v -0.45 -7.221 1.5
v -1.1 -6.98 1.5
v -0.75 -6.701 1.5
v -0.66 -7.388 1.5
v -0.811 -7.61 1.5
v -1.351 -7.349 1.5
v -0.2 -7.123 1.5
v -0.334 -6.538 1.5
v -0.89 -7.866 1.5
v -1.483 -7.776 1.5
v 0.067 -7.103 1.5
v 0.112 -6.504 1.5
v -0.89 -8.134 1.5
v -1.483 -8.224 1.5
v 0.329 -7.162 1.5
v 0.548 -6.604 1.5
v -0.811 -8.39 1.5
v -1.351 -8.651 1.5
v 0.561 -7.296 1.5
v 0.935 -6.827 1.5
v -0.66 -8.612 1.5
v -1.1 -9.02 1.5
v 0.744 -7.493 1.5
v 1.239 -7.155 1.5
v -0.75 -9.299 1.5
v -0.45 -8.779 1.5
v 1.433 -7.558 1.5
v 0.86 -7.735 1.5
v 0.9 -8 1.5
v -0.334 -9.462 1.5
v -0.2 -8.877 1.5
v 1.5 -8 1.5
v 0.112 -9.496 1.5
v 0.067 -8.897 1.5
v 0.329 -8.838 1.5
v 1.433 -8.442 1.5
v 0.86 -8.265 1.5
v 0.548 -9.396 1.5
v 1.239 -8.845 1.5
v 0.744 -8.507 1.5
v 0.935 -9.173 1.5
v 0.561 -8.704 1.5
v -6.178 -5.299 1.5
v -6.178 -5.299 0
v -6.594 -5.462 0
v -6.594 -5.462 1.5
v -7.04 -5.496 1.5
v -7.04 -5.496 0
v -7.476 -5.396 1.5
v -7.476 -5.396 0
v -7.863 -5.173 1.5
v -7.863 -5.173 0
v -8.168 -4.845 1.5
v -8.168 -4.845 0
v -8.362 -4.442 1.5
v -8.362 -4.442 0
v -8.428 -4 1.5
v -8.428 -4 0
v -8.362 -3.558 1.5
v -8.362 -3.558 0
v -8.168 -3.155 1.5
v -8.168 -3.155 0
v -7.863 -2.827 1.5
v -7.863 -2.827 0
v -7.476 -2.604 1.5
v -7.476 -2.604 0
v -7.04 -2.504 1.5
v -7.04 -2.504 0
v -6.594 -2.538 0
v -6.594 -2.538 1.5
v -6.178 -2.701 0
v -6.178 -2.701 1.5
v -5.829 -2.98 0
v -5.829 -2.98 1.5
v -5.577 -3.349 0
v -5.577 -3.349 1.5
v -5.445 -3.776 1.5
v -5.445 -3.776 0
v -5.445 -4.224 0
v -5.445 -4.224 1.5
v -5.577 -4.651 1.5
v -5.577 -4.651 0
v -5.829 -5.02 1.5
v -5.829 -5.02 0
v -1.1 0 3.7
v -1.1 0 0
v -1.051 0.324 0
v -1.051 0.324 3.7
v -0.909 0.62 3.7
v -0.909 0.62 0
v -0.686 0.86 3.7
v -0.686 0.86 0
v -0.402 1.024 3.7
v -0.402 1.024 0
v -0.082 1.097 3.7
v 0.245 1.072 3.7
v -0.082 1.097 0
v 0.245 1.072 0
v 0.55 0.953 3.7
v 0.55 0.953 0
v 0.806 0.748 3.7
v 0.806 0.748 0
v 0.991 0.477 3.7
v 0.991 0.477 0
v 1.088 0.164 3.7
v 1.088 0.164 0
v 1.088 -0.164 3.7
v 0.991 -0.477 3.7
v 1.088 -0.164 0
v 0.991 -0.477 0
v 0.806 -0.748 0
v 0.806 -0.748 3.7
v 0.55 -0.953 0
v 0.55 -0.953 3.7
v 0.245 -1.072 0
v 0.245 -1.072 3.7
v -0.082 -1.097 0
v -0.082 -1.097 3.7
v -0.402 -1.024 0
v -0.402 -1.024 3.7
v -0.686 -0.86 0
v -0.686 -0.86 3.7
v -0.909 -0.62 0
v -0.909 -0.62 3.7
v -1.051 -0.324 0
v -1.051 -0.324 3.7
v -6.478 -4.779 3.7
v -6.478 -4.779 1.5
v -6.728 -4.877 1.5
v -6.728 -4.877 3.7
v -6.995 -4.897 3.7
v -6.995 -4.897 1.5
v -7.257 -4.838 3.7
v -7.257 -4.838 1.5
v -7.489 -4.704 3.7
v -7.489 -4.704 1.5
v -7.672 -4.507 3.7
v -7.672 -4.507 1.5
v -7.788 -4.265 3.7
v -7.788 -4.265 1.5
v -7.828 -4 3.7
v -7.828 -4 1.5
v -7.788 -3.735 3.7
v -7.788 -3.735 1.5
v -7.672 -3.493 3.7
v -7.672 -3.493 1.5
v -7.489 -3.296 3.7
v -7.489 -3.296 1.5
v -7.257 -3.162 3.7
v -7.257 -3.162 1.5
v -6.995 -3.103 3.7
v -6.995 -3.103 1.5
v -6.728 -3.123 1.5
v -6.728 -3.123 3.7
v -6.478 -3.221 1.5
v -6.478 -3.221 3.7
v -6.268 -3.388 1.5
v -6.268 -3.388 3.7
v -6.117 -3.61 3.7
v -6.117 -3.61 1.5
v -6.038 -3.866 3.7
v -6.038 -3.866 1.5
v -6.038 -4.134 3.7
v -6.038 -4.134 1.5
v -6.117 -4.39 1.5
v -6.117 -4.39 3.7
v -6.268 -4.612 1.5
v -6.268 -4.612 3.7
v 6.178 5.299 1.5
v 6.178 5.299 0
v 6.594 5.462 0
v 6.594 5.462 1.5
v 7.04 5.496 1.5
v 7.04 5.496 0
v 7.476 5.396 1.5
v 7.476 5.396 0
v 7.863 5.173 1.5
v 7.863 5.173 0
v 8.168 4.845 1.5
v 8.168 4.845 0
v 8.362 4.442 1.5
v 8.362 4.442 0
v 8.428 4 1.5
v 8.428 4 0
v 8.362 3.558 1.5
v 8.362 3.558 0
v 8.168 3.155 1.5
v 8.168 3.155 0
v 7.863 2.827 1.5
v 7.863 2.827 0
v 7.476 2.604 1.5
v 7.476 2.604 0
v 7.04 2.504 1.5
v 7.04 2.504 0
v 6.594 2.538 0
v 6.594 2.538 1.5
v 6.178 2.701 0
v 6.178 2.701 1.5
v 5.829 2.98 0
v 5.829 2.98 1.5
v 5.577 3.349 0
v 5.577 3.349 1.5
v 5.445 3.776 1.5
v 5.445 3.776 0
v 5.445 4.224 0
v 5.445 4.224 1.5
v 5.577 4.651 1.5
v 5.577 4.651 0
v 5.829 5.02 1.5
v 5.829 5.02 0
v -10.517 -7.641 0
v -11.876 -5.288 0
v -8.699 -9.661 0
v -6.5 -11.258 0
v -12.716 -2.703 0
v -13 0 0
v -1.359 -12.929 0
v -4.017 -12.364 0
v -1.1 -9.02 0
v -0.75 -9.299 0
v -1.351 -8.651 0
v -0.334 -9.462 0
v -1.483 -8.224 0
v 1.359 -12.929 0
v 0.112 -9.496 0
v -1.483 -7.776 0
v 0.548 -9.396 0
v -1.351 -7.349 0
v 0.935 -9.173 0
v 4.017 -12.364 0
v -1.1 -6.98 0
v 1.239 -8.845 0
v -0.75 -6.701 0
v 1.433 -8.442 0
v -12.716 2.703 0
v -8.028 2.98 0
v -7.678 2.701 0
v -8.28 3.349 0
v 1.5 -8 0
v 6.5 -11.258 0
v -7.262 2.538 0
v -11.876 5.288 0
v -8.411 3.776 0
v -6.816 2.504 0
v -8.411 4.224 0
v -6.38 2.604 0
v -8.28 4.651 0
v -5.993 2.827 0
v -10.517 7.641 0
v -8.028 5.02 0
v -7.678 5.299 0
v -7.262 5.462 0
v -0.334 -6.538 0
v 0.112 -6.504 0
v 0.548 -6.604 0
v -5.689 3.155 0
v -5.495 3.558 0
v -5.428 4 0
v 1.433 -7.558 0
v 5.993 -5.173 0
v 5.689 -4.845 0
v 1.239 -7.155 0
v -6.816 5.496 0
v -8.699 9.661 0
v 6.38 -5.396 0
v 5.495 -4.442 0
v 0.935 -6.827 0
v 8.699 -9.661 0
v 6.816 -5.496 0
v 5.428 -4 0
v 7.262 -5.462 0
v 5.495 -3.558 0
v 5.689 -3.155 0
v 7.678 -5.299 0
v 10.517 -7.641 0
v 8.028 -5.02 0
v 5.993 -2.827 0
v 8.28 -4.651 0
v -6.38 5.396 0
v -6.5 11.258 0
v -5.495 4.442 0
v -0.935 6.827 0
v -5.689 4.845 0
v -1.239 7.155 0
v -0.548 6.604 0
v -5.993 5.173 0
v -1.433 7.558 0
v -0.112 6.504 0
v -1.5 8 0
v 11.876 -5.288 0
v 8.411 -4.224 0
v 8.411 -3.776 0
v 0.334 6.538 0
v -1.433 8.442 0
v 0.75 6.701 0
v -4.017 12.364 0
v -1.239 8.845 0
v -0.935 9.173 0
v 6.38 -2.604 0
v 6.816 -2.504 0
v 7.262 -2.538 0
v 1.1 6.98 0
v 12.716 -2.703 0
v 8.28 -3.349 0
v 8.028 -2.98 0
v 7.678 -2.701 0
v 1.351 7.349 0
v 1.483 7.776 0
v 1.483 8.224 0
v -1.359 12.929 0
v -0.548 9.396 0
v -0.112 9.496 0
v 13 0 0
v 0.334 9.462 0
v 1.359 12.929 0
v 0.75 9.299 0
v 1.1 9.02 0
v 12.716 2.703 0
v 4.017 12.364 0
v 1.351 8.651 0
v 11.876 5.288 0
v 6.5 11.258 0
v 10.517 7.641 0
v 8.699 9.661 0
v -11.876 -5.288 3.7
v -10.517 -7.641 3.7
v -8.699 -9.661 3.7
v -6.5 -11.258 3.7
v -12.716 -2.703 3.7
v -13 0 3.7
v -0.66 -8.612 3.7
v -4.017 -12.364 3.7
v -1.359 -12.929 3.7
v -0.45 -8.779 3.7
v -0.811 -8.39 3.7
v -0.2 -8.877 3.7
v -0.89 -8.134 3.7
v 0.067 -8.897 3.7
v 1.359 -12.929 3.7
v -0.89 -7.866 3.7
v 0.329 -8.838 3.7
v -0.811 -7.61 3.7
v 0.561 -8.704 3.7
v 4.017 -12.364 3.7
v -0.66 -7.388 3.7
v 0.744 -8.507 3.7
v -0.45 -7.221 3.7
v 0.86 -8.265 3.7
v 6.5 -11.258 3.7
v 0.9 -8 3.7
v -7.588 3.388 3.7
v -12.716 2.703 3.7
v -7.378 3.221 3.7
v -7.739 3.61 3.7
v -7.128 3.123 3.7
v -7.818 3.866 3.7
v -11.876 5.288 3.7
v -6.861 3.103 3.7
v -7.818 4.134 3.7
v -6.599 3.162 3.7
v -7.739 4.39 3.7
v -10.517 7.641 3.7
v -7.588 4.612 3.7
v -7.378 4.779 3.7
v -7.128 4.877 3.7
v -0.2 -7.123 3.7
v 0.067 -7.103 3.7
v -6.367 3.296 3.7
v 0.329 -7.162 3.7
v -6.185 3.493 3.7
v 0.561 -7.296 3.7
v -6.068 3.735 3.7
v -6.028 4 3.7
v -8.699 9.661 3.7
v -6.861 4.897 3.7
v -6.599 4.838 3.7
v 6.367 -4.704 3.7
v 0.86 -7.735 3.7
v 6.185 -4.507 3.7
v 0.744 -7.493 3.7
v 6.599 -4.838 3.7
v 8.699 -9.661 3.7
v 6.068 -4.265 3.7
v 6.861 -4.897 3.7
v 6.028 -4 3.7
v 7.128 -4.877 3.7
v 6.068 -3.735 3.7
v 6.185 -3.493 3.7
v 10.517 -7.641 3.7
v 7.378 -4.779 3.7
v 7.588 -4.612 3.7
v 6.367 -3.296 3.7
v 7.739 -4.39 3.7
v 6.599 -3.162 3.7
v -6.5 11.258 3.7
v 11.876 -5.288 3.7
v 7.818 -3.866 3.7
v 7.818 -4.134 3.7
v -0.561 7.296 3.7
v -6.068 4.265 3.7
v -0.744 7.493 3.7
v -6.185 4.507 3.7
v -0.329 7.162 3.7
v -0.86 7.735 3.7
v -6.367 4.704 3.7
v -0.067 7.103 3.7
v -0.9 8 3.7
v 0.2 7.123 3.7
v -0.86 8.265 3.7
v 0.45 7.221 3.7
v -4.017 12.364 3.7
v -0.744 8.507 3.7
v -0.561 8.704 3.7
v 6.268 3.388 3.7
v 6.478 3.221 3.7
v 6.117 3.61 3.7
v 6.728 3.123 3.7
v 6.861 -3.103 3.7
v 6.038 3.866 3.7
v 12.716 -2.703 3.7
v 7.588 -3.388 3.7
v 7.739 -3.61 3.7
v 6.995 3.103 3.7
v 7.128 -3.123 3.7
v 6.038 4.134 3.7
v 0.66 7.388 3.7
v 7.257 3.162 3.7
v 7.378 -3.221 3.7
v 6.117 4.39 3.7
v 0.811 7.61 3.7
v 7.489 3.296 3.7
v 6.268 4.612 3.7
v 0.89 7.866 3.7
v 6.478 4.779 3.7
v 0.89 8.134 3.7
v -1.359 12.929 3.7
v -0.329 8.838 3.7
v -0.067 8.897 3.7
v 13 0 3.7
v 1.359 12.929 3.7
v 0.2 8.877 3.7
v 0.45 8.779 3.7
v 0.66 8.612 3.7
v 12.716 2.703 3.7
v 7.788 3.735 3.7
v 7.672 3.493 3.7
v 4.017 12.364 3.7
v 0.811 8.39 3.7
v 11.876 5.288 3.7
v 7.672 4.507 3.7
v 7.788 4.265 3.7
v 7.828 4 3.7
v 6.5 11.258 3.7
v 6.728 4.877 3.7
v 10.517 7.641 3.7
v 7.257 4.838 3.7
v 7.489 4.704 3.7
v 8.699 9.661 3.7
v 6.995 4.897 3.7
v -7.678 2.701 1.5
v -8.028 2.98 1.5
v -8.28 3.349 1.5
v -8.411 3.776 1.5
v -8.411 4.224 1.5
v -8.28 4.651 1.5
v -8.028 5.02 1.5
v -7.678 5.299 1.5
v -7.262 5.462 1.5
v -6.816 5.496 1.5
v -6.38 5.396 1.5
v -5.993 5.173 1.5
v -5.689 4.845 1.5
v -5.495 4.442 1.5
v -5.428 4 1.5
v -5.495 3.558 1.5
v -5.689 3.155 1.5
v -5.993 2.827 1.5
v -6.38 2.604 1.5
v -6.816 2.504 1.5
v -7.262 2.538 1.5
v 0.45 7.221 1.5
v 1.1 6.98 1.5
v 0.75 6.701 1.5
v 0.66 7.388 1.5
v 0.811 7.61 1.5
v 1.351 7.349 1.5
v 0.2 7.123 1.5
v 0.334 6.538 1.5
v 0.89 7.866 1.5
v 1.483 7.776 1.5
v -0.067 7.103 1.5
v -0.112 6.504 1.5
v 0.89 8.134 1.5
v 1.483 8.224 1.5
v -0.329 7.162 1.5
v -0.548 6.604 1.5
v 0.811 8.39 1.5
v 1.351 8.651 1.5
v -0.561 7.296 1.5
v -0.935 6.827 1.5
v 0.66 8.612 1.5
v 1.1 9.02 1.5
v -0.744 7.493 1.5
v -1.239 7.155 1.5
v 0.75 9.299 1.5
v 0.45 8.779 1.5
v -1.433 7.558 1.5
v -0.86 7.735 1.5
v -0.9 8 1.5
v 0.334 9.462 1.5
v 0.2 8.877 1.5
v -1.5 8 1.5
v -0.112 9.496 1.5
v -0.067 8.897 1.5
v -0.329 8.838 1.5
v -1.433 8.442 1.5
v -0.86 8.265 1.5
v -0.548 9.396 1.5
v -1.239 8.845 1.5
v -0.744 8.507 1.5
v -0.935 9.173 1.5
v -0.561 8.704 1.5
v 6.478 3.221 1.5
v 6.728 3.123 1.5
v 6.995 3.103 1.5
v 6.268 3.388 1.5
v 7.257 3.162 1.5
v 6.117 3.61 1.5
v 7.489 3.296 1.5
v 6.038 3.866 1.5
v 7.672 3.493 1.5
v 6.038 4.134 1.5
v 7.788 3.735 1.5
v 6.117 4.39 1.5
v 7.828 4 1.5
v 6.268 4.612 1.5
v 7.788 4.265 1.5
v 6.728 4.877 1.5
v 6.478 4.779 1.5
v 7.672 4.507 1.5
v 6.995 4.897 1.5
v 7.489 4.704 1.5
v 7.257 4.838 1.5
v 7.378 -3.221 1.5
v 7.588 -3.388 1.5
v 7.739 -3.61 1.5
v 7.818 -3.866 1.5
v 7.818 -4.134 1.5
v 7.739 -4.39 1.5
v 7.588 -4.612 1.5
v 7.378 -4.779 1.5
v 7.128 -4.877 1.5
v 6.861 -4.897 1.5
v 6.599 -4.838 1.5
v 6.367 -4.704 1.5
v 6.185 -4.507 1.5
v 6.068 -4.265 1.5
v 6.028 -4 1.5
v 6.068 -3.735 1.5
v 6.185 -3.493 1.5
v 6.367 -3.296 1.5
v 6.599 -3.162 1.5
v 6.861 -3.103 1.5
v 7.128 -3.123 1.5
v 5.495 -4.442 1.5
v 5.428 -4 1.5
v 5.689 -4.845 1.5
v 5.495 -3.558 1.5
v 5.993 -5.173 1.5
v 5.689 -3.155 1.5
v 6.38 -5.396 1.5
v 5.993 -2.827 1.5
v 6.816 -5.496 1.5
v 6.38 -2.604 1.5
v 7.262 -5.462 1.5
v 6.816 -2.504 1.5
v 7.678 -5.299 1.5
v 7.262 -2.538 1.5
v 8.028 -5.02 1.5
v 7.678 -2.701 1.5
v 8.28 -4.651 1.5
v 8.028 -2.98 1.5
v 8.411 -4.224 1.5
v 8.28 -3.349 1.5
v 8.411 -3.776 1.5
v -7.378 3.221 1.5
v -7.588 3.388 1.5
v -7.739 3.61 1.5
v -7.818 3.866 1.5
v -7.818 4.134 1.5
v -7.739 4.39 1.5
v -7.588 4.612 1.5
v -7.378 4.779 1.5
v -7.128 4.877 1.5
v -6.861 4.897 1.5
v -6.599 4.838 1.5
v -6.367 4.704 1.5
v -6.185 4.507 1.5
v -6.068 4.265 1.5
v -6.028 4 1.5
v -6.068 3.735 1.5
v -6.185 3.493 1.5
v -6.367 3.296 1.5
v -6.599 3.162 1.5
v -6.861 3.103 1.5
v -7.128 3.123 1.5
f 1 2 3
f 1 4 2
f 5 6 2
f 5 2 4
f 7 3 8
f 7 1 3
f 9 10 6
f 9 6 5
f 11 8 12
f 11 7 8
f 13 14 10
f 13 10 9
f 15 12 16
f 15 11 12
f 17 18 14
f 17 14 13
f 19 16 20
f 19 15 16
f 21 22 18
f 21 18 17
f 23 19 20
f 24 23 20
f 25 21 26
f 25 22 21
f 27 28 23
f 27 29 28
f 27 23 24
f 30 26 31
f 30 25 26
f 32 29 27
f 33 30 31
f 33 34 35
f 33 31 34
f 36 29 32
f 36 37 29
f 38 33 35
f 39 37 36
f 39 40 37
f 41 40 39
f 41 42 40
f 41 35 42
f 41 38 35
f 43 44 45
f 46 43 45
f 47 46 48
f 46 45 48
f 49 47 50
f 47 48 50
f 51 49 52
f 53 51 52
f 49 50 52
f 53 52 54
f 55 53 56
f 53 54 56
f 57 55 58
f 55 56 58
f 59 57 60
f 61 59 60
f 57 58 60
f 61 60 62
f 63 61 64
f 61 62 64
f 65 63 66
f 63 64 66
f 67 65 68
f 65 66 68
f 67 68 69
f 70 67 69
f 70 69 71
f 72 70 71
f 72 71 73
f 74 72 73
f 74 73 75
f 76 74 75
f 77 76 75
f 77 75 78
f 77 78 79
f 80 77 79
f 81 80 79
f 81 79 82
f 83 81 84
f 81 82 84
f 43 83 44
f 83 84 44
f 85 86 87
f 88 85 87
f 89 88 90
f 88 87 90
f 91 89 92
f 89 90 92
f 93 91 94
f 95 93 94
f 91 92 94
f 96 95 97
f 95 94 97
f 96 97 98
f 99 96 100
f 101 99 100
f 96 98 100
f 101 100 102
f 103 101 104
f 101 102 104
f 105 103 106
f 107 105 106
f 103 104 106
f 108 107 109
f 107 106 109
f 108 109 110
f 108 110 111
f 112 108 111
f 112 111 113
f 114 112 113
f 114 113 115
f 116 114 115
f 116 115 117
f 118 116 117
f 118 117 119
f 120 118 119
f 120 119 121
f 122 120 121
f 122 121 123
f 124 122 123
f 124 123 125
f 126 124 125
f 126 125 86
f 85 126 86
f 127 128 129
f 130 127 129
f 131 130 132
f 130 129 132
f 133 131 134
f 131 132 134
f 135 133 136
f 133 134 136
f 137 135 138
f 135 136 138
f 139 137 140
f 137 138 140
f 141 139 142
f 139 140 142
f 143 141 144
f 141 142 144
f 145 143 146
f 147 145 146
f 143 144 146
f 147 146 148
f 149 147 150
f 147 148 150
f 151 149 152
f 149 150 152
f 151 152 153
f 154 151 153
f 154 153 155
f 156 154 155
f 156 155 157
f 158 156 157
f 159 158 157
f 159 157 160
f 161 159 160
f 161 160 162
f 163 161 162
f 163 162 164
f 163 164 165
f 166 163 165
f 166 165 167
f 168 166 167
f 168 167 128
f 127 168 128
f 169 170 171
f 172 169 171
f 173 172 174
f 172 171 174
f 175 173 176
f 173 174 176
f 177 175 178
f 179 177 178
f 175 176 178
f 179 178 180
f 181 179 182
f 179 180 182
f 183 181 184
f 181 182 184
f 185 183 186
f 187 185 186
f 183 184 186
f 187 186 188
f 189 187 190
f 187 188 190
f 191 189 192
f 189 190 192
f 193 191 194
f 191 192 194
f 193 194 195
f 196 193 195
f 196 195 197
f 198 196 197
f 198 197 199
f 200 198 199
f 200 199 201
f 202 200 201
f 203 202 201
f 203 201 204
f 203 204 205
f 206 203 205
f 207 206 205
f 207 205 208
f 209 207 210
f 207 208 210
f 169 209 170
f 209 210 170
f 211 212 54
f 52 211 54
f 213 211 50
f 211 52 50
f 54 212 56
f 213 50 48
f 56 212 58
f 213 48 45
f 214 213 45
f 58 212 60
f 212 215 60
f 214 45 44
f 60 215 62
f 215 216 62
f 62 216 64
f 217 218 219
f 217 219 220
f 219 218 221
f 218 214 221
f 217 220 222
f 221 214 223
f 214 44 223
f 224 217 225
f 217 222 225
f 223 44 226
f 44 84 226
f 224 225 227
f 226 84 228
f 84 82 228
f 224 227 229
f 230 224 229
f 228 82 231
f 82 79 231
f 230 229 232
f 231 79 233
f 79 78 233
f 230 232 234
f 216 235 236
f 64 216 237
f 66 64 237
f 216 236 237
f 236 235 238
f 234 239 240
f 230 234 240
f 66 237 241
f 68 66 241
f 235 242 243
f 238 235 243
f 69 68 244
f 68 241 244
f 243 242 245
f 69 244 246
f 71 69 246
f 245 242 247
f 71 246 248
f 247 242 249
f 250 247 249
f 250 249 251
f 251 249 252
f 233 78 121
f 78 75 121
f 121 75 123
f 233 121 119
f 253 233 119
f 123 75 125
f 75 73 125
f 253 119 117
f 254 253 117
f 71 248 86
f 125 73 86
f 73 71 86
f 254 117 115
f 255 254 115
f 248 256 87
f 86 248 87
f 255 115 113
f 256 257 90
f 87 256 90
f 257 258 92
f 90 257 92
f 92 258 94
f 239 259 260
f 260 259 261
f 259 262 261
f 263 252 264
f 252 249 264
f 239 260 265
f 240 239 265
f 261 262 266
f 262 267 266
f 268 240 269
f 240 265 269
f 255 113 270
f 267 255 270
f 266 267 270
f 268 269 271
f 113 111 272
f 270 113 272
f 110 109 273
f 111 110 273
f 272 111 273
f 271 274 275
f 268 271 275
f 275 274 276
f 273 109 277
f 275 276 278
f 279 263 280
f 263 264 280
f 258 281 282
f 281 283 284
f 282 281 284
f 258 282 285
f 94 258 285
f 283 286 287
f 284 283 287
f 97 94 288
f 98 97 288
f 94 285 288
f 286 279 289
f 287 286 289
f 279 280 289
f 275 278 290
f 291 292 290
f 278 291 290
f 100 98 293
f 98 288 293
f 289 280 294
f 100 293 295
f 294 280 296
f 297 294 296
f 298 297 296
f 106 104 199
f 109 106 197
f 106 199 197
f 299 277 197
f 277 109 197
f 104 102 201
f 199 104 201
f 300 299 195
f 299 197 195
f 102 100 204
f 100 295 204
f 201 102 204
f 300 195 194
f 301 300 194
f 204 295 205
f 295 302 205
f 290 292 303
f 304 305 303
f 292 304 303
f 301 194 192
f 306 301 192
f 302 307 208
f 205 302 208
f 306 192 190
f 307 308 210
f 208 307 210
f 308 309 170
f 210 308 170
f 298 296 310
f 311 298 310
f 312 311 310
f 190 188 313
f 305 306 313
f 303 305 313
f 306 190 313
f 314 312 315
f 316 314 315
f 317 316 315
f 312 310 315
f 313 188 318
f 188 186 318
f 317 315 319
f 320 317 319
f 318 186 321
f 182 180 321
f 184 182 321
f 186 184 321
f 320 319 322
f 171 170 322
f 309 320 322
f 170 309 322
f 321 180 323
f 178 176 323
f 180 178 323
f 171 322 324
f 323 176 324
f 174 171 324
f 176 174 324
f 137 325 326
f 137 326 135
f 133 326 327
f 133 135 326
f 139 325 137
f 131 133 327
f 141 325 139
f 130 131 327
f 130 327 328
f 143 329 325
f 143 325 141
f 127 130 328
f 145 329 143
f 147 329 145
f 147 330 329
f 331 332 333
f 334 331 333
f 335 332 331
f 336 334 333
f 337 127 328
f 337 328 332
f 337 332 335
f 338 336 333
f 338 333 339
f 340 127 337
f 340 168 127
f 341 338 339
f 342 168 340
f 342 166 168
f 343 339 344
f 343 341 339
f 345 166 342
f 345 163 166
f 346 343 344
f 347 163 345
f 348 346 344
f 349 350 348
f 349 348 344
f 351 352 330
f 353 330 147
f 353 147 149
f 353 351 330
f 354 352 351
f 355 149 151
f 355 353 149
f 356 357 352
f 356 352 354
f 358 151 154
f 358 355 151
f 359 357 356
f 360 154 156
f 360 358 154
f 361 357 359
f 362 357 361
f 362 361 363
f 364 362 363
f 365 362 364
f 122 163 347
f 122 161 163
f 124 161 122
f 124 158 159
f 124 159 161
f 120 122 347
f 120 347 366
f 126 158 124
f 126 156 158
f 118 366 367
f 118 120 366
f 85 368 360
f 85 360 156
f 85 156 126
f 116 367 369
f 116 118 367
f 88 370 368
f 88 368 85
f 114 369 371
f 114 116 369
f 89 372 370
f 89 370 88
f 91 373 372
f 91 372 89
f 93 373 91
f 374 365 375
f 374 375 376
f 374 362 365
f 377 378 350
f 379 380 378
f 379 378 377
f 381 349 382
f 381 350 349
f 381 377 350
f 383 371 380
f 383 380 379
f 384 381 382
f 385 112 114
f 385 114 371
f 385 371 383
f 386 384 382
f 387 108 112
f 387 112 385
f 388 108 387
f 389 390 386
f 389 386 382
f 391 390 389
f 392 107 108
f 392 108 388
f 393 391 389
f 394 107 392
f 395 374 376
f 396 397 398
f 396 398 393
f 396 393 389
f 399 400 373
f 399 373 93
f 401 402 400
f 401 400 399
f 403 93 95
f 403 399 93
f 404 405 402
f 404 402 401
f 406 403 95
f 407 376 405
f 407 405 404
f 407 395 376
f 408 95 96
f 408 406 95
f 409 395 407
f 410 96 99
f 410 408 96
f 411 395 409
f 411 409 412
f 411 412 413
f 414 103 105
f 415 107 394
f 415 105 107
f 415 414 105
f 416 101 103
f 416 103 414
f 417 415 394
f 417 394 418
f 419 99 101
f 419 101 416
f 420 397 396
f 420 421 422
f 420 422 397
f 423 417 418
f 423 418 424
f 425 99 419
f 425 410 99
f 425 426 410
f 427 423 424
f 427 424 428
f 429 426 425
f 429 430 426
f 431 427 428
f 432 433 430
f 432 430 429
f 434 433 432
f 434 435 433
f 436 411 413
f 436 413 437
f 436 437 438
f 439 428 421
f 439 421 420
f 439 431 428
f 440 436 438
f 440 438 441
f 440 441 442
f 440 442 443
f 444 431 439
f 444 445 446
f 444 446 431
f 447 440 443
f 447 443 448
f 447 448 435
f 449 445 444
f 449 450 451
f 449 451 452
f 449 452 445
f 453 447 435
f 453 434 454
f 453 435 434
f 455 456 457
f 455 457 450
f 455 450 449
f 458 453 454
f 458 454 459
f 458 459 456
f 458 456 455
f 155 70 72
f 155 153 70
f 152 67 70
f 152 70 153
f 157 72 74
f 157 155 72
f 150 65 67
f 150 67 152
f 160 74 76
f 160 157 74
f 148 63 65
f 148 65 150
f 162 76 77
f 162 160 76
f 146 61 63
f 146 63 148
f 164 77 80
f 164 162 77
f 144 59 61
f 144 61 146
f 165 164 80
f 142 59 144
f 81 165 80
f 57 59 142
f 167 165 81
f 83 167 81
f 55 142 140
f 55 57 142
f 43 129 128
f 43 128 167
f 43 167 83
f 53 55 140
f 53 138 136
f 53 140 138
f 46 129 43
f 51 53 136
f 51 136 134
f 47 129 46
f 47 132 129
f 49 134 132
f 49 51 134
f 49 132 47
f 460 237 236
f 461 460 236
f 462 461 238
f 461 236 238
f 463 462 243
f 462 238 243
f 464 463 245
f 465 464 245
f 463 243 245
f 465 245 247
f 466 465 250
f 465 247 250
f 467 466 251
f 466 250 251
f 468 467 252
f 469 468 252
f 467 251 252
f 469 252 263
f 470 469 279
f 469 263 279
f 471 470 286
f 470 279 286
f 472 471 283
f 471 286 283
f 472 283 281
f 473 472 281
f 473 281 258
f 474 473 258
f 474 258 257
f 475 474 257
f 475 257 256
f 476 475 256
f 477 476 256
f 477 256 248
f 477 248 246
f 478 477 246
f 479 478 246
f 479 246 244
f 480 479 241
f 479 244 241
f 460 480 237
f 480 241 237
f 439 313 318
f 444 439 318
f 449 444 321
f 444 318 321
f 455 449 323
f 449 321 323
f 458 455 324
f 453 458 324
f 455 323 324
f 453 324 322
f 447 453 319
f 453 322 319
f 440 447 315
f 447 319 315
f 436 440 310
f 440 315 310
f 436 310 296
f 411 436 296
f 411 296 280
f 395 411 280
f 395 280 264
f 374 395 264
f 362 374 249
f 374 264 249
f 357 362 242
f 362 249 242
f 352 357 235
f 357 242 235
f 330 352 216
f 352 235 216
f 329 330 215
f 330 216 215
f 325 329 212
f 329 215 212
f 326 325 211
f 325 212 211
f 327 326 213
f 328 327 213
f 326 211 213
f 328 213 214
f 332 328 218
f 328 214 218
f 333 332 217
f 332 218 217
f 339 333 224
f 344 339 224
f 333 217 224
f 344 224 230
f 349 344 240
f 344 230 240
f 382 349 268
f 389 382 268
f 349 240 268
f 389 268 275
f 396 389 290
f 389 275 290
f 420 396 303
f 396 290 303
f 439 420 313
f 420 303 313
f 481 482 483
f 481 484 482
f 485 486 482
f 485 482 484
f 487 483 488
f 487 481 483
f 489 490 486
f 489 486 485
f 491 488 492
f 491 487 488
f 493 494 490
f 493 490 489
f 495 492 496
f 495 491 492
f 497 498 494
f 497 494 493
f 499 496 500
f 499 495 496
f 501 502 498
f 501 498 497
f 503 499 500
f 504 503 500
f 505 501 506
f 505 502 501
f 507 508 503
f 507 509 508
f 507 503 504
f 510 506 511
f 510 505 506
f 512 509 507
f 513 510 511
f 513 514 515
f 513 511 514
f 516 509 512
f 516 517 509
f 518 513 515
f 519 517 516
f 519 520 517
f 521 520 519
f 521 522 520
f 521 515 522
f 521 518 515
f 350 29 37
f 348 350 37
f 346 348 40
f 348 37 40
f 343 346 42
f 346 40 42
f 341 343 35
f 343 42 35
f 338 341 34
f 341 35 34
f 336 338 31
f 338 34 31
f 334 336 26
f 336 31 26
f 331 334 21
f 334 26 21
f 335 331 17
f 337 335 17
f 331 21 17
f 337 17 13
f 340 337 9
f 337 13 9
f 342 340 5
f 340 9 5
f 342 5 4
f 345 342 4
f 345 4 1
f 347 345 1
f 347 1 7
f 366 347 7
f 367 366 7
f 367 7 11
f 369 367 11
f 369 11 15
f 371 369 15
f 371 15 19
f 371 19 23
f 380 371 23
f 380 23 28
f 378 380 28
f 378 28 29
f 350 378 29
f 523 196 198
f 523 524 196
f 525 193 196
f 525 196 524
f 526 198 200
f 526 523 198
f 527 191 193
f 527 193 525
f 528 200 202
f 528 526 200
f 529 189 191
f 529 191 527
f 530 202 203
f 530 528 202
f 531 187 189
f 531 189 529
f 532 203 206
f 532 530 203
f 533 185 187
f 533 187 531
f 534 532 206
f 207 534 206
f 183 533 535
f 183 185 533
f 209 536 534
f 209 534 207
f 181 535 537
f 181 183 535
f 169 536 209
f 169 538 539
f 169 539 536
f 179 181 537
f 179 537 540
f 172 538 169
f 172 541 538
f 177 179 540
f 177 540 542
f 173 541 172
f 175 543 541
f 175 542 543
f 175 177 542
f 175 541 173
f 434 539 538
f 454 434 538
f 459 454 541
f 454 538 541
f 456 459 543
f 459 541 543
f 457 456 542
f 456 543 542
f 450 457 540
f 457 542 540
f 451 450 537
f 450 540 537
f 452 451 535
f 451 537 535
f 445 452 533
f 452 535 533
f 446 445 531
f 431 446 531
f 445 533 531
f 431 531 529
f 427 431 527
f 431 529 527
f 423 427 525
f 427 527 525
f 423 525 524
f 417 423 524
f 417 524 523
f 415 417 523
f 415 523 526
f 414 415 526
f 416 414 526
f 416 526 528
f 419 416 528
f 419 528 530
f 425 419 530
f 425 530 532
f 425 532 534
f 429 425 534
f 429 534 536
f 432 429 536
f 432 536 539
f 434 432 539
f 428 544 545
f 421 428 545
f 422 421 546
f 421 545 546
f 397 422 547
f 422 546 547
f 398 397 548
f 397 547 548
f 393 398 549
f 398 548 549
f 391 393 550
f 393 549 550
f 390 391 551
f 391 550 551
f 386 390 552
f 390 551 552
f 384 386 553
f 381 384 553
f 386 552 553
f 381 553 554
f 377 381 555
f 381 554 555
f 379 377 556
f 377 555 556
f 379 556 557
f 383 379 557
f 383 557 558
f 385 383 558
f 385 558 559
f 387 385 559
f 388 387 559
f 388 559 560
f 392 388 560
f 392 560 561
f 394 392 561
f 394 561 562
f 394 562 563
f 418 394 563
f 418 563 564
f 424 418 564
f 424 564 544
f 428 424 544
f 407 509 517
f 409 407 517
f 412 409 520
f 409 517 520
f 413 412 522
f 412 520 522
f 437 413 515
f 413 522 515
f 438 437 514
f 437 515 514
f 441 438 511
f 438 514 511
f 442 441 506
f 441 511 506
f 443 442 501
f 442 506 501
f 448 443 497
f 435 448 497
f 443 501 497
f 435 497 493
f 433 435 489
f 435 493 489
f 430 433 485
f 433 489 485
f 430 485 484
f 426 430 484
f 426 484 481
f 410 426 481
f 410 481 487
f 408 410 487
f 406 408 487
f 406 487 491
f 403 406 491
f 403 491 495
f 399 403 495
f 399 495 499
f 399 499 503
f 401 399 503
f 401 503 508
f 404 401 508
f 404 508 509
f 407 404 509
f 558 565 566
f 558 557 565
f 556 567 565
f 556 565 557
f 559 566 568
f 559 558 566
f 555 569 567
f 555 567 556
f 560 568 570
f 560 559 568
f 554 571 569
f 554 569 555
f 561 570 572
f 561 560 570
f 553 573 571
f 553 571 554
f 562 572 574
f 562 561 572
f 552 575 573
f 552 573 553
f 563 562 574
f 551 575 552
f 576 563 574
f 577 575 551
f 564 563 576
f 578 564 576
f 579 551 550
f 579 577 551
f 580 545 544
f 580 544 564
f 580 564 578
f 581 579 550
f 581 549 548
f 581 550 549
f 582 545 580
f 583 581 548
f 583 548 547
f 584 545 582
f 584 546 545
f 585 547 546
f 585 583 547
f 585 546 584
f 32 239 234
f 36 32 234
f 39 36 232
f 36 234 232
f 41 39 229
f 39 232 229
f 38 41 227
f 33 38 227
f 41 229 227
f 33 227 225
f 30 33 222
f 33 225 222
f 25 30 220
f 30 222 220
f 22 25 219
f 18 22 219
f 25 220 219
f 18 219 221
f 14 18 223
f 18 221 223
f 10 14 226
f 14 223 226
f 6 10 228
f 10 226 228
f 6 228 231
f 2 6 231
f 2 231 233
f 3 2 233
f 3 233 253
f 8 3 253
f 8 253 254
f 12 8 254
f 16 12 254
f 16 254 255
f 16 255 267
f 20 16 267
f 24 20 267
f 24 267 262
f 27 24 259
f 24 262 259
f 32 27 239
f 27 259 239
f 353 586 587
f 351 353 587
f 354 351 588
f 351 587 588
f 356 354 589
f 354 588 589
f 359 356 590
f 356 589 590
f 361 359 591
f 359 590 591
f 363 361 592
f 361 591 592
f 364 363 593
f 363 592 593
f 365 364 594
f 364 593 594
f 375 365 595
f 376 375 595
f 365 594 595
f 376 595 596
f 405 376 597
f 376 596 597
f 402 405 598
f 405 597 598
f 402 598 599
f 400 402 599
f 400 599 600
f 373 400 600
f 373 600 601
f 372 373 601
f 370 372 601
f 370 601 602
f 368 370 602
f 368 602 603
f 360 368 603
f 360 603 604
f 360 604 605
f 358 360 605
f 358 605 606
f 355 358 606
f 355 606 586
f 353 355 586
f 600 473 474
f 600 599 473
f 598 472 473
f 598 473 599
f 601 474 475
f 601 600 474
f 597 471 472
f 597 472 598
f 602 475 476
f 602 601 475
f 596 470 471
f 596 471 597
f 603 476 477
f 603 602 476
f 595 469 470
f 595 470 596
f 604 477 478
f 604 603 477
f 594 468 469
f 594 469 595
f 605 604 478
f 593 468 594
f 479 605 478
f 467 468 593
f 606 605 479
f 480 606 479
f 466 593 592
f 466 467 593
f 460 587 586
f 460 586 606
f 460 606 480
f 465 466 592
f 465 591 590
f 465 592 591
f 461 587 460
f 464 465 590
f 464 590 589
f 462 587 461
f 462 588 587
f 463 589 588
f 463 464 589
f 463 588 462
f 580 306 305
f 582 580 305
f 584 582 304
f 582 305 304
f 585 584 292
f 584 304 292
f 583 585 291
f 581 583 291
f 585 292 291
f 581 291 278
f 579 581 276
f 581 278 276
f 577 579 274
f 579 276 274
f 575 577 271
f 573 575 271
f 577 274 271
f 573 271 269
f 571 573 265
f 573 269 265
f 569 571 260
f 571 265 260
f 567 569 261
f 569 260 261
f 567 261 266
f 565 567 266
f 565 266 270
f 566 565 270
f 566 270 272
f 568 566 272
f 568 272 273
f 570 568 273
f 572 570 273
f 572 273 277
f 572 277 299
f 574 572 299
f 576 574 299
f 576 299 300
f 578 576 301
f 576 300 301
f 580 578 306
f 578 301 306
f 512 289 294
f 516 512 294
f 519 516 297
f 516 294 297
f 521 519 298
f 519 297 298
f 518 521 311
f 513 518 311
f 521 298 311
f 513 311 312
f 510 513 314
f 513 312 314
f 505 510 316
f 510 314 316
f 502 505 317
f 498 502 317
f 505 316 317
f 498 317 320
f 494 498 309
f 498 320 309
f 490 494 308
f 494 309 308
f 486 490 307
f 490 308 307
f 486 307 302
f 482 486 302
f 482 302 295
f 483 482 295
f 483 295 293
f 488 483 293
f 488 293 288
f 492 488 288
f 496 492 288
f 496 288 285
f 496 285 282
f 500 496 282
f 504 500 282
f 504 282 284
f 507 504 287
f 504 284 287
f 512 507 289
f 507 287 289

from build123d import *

# Parameters (mm, degrees)
SKETCH_1_R               = 13
EXTRUDE_1_DEPTH          = 3.7
SKETCH_2_R               = 0.9
CUT_EXTRUDE_1_DEPTH      = 19.753399692
SKETCH_2_3_R             = 1.5
CUT_EXTRUDE_2_DEPTH      = 1.5
PATTERN_CIRCULAR_1_COUNT = 6
SKETCH_3_R               = 1.1
CUT_EXTRUDE_3_DEPTH      = 19.753399692


with BuildPart() as part:
    # 草图1 → 凸台-拉伸1 (new body)
    with BuildSketch(Plane.XY):
        Circle(SKETCH_1_R)
    extrude(amount=EXTRUDE_1_DEPTH)

    # 草图2 → 切除-拉伸1 (cut, through all)
    with BuildSketch(Plane(origin=(0, 0, 0), x_dir=(-1, 0, 0), z_dir=(0, 0, -1))):
        with Locations((0, 8)):
            Circle(SKETCH_2_R)
    cut_extrude_1 = extrude(amount=-CUT_EXTRUDE_1_DEPTH, mode=Mode.SUBTRACT)

    # 草图2<3> → 切除-拉伸2 (cut)
    with BuildSketch(Plane(origin=(0, 0, 0), x_dir=(-1, 0, 0), z_dir=(0, 0, -1))):
        with Locations((0, 8)):
            Circle(SKETCH_2_3_R)
    cut_extrude_2 = extrude(amount=-CUT_EXTRUDE_2_DEPTH, mode=Mode.SUBTRACT)

    # 阵列(圆周)1: 切除-拉伸1, 切除-拉伸2 ×6 about axis
    pattern_circular_1_axis = Axis((0, 0, 3.7), (0, 0, -1))
    add([cut_extrude_1.rotate(pattern_circular_1_axis, i * 360 / PATTERN_CIRCULAR_1_COUNT) for i in range(1, PATTERN_CIRCULAR_1_COUNT)], mode=Mode.SUBTRACT)
    add([cut_extrude_2.rotate(pattern_circular_1_axis, i * 360 / PATTERN_CIRCULAR_1_COUNT) for i in range(1, PATTERN_CIRCULAR_1_COUNT)], mode=Mode.SUBTRACT)

    # 草图3 → 切除-拉伸3 (cut, through all)
    with BuildSketch(Plane(origin=(0, 0, 0), x_dir=(-1, 0, 0), z_dir=(0, 0, -1))):
        Circle(SKETCH_3_R)
    extrude(amount=-CUT_EXTRUDE_3_DEPTH, mode=Mode.SUBTRACT)


solid = part.part
